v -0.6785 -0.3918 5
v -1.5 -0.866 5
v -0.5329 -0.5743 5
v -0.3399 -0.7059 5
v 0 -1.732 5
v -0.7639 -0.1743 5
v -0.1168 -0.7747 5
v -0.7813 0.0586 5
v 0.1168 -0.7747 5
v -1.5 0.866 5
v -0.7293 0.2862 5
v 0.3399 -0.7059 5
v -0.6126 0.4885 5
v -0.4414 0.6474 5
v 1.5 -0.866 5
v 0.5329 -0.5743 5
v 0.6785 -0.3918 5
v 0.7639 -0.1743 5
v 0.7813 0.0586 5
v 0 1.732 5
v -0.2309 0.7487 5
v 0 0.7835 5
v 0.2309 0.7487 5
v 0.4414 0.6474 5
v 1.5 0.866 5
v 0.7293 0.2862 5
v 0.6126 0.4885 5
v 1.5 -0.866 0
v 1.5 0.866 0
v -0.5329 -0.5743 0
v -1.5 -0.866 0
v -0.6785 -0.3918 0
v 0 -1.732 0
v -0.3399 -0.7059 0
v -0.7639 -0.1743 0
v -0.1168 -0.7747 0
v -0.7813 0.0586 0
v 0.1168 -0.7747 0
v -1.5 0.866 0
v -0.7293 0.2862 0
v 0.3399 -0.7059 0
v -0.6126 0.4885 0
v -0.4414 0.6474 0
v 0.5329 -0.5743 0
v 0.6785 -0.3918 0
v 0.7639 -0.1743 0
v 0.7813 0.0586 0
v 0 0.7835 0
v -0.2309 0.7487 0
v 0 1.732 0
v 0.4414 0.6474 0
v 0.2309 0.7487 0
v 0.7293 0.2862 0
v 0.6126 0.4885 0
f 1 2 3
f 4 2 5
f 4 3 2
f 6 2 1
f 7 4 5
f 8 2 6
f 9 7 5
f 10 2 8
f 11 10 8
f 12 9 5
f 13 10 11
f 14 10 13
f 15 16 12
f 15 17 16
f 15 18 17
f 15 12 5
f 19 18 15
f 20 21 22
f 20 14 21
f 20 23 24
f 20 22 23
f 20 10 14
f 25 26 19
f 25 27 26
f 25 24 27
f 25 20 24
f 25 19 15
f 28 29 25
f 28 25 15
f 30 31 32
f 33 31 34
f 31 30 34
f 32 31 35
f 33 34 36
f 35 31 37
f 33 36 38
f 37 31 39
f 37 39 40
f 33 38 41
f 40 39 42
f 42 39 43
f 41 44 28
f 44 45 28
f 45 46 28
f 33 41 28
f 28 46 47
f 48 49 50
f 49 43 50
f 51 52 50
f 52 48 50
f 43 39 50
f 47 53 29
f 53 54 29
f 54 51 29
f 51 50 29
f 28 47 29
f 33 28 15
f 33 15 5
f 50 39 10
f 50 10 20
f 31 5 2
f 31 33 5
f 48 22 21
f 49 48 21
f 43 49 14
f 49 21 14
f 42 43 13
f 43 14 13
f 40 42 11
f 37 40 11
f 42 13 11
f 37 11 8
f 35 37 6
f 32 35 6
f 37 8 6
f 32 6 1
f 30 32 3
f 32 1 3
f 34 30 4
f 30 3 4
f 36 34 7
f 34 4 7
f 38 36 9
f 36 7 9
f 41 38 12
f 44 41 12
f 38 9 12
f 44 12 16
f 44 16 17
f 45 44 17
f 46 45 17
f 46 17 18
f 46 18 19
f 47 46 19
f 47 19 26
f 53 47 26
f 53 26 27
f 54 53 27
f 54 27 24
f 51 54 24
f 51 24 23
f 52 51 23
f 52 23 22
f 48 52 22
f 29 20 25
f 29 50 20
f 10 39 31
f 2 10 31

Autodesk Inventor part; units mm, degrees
ref_plane "YZ Plane" through (0, 0, 0) normal (1, 0, 0) x (0, 1, 0)
ref_plane "XZ Plane" through (0, 0, 0) normal (0, 1, 0) x (-1, 0, 0)
ref_plane "XY Plane" through (0, 0, 0) normal (0, 0, 1) x (1, 0, 0)
sketch "Sketch1" plane through (0, 0, 0) normal (0, 0, 1) x (1, 0, 0)
  line L0 (1.5, 0.866) -> (1.5, -0.866)
  line L1 (1.5, -0.866) -> (0, -1.732)
  line L2 (0, -1.732) -> (-1.5, -0.866)
  line L3 (-1.5, 0.866) -> (-1.5, -0.866)
  line L4 (-1.5, 0.866) -> (0, 1.732)
  line L5 (0, 1.732) -> (1.5, 0.866)
  circle A0 centre (0, 0) radius 1.732 construction
  line L6 (0, 30.018) -> (0, -6.2677) construction
  line L7 (0, -13.5249) -> (0, 37.2751) projected
  line L8 (-2.4248, 0) -> (2.4248, 0) projected
  dimension "d0" = 3.464
  dimension "d20" = 2.9999
  dimension "d21" = 1.732
extrude "Hexagon1" add sketch "Sketch1" along normal blind 5
hole "Hole1" at (0, 0, 0) direction (0, 0, 1) diameter 1.567 end through all thread size "M2x0.4" class "6H" standard "ISO Metric profile"
properties part number "Spacer-M2-FF-05" material "Brass, Soft Yellow, Welded"
